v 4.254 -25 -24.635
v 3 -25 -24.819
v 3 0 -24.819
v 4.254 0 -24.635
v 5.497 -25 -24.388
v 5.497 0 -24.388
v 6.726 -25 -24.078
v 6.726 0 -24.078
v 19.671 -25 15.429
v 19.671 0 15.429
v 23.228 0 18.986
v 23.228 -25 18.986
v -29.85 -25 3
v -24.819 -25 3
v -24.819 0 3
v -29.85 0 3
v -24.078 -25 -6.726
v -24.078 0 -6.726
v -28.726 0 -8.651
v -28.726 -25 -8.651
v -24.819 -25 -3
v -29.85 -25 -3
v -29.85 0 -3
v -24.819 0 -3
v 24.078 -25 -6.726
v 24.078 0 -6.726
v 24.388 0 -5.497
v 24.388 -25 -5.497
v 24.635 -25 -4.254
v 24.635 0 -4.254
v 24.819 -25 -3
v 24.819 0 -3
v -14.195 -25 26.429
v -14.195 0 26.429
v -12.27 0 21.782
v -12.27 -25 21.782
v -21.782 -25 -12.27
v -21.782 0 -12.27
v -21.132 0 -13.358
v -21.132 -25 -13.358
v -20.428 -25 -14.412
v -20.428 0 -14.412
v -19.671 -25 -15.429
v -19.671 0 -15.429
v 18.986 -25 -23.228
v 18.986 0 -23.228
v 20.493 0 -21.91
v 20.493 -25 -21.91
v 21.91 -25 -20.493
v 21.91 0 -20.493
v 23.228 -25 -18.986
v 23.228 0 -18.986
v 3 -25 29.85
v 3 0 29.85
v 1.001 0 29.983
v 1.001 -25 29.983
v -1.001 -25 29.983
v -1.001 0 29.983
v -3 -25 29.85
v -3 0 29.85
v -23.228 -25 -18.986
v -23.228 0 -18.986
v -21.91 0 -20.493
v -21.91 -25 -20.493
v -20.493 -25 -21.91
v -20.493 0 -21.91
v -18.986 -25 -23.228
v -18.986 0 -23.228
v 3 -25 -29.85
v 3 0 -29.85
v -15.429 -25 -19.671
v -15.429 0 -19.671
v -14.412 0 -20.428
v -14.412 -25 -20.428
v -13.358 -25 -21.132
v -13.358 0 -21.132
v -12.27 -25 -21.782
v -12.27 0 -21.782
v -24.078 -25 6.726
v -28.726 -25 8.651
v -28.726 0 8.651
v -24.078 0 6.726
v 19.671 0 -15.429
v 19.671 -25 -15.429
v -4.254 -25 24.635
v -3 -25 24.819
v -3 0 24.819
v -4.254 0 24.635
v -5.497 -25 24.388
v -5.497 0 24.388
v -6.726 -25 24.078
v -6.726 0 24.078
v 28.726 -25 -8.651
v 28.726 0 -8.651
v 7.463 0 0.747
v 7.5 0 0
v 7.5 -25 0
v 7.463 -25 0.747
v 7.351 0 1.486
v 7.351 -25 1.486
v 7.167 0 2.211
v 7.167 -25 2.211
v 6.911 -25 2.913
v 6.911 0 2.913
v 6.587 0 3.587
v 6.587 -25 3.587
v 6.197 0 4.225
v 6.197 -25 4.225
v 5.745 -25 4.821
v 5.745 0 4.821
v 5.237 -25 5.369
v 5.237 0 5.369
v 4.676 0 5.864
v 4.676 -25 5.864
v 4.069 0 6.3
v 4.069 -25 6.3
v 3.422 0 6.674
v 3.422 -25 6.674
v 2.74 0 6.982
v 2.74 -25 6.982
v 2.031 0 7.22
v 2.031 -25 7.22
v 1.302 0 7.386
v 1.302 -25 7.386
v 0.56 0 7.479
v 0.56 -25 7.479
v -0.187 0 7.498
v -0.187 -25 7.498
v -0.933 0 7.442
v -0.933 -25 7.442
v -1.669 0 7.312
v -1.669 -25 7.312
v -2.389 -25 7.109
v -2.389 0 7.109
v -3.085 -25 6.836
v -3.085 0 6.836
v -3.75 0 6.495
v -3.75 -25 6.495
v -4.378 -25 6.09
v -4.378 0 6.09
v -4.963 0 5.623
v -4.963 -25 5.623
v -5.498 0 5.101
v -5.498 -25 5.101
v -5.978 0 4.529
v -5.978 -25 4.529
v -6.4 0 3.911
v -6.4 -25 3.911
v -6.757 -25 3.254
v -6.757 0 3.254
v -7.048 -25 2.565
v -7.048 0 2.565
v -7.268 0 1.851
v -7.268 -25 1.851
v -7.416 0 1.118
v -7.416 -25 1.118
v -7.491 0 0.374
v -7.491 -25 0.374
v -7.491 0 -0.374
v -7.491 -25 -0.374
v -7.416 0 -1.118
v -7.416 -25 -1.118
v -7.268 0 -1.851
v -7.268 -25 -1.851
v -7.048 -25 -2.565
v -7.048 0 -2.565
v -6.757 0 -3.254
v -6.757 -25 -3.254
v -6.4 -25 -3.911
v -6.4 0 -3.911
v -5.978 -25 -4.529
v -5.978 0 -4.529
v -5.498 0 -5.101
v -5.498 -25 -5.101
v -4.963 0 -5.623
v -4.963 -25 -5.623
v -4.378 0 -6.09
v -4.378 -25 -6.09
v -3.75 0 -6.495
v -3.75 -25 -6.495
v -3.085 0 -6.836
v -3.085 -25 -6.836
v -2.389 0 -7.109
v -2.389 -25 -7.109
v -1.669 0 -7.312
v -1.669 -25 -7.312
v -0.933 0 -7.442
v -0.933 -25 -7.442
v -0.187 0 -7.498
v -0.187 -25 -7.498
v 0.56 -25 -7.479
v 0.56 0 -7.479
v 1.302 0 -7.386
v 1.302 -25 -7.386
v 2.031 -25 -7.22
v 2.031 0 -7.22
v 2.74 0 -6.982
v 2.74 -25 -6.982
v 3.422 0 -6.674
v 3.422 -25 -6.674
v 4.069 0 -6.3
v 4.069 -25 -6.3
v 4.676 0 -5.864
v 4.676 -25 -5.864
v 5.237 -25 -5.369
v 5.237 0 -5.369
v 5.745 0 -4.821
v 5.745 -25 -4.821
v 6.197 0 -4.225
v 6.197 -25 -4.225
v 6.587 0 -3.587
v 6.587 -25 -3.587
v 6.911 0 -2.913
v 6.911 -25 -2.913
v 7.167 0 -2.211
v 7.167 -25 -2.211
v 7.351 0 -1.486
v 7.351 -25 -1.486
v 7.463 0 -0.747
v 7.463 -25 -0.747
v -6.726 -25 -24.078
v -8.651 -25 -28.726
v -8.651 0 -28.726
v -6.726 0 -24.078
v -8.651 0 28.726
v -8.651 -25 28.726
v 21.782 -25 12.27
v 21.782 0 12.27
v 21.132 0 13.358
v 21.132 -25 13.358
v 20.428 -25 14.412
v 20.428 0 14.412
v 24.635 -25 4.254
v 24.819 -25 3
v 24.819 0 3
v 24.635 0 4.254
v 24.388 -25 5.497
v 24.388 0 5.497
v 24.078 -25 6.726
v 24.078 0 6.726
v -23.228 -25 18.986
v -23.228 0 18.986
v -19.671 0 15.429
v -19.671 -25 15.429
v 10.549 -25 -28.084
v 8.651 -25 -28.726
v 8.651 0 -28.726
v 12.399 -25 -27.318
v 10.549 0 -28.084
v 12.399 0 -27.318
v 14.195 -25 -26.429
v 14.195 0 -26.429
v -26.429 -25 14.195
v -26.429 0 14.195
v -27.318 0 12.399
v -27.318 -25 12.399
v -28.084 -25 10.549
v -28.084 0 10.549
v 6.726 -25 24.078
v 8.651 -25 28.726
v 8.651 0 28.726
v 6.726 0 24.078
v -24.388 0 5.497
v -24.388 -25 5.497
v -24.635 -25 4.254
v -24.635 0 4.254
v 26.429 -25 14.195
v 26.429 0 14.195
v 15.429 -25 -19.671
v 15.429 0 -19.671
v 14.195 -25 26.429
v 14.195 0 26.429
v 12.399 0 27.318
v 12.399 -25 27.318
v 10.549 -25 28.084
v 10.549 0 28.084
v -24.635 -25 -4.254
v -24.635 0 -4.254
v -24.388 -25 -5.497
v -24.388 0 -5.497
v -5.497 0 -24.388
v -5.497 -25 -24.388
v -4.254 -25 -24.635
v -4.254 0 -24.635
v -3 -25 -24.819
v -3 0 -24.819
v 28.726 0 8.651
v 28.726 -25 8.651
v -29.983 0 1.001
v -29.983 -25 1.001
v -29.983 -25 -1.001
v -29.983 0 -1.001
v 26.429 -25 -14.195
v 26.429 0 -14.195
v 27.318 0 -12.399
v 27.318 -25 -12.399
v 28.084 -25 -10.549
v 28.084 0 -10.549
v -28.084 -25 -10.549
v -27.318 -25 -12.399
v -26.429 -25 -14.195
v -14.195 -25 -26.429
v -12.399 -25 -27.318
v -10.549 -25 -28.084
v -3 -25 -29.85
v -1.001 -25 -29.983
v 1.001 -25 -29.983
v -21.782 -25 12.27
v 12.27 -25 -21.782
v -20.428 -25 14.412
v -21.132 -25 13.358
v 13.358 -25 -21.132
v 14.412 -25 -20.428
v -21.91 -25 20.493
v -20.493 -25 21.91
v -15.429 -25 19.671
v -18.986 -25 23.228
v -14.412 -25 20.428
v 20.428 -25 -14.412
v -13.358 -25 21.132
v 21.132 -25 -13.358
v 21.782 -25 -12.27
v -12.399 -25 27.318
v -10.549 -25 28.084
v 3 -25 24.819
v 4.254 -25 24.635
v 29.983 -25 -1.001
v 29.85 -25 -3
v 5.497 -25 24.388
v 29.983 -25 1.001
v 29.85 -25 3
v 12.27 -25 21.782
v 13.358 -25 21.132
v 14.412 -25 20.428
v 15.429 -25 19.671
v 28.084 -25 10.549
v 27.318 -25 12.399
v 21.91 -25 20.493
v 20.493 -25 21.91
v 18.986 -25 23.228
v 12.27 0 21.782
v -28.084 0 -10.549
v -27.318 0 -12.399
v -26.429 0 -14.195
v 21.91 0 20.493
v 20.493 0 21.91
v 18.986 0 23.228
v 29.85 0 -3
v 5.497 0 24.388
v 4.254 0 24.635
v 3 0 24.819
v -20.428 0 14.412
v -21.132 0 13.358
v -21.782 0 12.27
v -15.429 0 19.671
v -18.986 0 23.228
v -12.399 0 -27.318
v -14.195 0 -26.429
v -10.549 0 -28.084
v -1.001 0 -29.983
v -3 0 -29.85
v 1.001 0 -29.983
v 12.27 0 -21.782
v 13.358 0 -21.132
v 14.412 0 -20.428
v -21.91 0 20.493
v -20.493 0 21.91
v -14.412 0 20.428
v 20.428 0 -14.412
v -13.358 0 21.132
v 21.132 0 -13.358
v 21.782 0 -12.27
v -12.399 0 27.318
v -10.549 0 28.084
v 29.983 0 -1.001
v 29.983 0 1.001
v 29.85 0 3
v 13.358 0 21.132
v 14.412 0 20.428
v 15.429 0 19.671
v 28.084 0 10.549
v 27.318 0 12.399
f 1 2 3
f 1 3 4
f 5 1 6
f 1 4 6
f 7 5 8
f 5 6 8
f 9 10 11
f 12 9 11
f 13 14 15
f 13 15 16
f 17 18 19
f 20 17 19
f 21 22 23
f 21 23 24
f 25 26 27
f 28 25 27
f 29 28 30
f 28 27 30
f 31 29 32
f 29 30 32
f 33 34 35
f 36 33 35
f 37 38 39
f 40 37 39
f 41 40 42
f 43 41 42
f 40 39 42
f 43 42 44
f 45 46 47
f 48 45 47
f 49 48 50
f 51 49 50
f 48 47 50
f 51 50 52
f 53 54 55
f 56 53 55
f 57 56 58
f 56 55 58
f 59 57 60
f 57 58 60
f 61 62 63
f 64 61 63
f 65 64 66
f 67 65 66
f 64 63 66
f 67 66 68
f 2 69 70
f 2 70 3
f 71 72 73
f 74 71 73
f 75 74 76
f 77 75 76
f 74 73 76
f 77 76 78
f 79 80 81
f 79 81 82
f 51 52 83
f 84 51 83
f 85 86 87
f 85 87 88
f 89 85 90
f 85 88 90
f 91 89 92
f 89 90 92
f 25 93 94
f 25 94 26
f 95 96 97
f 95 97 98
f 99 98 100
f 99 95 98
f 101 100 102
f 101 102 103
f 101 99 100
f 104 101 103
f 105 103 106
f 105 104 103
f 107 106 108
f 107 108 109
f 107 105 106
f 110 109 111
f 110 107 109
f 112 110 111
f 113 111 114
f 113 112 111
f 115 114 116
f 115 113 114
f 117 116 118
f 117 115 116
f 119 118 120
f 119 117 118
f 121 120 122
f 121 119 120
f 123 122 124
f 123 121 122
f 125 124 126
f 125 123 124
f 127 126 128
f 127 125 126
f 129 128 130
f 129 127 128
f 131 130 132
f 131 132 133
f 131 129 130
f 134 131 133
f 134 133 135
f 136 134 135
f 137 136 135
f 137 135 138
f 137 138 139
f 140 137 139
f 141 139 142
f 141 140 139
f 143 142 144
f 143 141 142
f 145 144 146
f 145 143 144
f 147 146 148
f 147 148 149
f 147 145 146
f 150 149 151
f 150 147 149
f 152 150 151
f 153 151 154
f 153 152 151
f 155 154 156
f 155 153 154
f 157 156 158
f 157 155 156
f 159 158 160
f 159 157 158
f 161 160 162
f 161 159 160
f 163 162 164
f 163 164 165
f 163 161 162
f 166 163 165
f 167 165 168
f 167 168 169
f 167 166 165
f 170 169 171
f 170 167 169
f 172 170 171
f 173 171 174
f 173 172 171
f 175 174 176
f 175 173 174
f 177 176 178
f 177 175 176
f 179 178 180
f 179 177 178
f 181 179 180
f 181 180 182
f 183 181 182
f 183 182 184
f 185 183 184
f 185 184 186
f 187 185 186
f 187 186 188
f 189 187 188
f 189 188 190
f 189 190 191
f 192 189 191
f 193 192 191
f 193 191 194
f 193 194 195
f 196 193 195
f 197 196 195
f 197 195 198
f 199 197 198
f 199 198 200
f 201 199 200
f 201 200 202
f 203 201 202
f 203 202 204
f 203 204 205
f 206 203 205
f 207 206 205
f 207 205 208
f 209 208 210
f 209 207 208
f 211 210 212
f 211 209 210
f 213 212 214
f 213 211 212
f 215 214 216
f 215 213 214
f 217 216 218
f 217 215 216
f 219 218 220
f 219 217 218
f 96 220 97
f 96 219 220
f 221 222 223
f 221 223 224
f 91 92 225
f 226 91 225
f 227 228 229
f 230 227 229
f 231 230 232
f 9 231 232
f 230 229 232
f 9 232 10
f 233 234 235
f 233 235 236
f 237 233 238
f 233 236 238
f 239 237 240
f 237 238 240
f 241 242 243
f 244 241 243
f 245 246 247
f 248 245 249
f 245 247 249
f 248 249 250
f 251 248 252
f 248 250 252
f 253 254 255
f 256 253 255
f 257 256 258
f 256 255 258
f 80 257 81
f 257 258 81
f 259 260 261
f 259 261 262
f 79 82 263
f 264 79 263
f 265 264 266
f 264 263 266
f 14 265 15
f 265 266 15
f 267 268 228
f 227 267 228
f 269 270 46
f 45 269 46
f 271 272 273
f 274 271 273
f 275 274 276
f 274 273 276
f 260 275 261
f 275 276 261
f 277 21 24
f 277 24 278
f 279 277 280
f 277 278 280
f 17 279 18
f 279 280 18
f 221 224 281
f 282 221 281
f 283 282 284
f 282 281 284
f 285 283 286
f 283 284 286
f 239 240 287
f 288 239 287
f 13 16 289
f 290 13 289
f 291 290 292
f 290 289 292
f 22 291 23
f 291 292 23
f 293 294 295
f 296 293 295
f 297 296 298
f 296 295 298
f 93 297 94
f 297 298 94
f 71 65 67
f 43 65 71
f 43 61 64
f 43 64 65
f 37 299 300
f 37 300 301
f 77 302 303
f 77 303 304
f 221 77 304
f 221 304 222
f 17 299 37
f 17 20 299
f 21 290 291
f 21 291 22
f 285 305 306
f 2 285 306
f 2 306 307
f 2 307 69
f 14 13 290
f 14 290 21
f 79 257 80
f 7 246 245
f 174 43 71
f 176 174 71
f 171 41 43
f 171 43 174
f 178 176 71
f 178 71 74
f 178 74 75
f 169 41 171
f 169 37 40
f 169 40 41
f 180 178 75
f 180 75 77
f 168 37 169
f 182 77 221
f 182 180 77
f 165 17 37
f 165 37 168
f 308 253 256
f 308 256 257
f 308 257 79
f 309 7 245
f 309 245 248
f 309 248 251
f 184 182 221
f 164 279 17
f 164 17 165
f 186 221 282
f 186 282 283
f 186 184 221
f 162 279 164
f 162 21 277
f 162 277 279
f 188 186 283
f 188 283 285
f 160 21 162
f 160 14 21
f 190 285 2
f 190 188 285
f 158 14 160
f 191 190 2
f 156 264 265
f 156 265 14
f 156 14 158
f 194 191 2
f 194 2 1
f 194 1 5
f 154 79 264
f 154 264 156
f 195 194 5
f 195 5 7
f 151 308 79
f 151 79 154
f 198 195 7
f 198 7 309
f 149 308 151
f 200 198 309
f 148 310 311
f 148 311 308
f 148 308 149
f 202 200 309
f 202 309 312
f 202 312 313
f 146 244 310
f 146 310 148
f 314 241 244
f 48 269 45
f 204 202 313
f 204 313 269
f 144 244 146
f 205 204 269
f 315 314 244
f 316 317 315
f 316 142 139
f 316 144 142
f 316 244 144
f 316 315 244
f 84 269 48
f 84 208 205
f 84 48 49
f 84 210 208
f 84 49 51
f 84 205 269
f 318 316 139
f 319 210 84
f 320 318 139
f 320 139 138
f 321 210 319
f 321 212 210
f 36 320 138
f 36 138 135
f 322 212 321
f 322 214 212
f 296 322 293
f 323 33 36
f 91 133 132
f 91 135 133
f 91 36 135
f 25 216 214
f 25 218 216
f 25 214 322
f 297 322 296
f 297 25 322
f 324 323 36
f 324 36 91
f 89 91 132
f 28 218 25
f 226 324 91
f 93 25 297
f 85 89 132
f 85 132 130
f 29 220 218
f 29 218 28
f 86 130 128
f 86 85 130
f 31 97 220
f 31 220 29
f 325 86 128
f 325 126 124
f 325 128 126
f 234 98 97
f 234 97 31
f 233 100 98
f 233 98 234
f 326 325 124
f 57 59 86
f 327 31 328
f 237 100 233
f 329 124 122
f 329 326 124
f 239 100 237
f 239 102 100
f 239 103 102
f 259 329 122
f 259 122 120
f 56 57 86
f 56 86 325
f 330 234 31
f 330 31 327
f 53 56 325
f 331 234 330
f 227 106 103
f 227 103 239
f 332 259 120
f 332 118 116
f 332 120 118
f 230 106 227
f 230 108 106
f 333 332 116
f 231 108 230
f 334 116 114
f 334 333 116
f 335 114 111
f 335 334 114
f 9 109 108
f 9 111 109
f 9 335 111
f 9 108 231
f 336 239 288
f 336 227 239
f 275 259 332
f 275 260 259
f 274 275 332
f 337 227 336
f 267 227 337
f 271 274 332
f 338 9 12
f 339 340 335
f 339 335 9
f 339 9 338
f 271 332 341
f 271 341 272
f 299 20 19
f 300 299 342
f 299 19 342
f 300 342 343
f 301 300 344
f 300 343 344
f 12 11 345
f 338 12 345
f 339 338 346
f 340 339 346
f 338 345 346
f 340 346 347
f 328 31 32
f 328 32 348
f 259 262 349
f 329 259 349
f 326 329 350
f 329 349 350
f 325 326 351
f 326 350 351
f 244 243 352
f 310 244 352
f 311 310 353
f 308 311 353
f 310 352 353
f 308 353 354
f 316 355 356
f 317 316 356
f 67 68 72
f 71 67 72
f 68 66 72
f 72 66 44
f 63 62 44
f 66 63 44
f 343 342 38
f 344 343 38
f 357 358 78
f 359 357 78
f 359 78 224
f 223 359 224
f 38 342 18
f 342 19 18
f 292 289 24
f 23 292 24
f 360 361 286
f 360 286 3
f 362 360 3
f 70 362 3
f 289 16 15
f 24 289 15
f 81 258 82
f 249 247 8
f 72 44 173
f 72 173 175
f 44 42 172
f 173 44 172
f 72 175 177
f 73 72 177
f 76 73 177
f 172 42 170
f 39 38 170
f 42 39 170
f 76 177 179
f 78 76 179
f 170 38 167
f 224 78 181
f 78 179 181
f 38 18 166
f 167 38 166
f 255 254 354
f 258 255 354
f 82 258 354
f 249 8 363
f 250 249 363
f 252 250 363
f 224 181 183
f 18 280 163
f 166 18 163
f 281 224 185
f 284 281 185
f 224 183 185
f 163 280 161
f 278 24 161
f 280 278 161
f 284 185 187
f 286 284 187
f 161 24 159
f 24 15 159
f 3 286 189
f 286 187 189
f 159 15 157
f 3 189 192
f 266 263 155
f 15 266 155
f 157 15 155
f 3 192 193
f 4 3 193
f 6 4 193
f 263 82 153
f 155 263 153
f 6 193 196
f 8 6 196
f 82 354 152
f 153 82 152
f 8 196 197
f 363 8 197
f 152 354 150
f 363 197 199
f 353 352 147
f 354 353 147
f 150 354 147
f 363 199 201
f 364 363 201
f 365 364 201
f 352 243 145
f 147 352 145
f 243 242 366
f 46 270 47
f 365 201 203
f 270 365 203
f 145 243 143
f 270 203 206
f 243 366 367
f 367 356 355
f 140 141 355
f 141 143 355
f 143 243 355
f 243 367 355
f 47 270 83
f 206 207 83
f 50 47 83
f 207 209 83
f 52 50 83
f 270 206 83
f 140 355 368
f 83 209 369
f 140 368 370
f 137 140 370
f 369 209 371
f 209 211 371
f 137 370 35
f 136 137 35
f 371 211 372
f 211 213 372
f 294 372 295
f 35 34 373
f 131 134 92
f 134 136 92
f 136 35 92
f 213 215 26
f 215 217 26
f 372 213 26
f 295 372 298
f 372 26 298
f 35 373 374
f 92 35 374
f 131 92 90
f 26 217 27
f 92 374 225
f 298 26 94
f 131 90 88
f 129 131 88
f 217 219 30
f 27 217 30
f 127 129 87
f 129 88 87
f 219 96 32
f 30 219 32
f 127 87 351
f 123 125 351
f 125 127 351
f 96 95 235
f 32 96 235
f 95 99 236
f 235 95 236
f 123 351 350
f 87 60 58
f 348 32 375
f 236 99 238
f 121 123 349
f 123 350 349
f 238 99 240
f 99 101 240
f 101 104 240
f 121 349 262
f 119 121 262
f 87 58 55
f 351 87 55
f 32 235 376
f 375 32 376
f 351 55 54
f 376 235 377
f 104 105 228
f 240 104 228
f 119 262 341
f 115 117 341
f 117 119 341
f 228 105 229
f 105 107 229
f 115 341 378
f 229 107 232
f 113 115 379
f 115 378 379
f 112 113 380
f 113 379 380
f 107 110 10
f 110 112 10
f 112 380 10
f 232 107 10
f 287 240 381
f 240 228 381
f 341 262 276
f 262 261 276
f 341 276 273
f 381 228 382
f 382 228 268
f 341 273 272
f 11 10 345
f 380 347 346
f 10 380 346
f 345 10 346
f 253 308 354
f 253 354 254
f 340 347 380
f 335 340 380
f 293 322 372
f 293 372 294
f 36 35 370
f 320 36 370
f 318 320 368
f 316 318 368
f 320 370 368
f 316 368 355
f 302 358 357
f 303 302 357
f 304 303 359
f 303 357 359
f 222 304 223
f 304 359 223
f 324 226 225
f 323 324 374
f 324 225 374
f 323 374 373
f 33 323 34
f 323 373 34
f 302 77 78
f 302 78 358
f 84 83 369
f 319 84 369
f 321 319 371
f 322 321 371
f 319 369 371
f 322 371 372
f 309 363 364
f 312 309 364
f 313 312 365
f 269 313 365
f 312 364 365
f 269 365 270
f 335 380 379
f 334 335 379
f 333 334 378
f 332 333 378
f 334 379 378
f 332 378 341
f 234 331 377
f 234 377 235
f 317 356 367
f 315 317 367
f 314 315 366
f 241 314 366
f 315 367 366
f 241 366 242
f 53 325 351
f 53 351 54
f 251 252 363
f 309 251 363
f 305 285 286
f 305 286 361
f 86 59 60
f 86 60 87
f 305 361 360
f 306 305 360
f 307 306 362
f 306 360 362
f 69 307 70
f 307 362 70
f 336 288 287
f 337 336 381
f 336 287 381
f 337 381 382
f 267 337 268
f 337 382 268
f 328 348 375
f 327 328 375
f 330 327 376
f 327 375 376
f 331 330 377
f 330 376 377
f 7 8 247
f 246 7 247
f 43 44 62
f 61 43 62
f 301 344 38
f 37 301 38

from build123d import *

# Parameters (mm, degrees)
F0_R     = 7.5
F1_DEPTH = 25


with BuildPart() as f1:
    # F0 (on Front) → F1 (new body)
    with BuildSketch(Plane.XZ):
        with BuildLine():
            Line((3, 24.819347), (3, 29.849623))
            ThreePointArc((3, 29.849623), (0, 30), (-3, 29.849623))
            Line((-3, 29.849623), (-3, 24.819347))
            ThreePointArc((-3, 24.819347), (-4.877258, 24.519632), (-6.726314, 24.078137))
            ThreePointArc((-6.726314, 24.078137), (-9.567086, 23.096988), (-12.269592, 21.782037))
            ThreePointArc((-12.269592, 21.782037), (-13.889256, 20.78674), (-15.428608, 19.671249))
            ThreePointArc((-15.428608, 19.671249), (-17.67767, 17.67767), (-19.671249, 15.428608))
            ThreePointArc((-19.671249, 15.428608), (-20.78674, 13.889256), (-21.782037, 12.269592))
            ThreePointArc((-21.782037, 12.269592), (-23.096988, 9.567086), (-24.078137, 6.726314))
            ThreePointArc((-24.078137, 6.726314), (-24.519632, 4.877258), (-24.819347, 3))
            ThreePointArc((-24.819347, 3), (-25, 0), (-24.819347, -3))
            ThreePointArc((-24.819347, -3), (-24.519632, -4.877258), (-24.078137, -6.726314))
            ThreePointArc((-24.078137, -6.726314), (-23.096988, -9.567086), (-21.782037, -12.269592))
            ThreePointArc((-21.782037, -12.269592), (-20.78674, -13.889256), (-19.671249, -15.428608))
            ThreePointArc((-19.671249, -15.428608), (-17.67767, -17.67767), (-15.428608, -19.671249))
            ThreePointArc((-15.428608, -19.671249), (-13.889256, -20.78674), (-12.269592, -21.782037))
            ThreePointArc((-12.269592, -21.782037), (-9.567086, -23.096988), (-6.726314, -24.078137))
            ThreePointArc((-6.726314, -24.078137), (-4.877258, -24.519632), (-3, -24.819347))
            ThreePointArc((-3, -24.819347), (0, -25), (3, -24.819347))
            ThreePointArc((3, -24.819347), (4.877258, -24.519632), (6.726314, -24.078137))
            ThreePointArc((6.726314, -24.078137), (9.567086, -23.096988), (12.269592, -21.782037))
            ThreePointArc((12.269592, -21.782037), (13.889256, -20.78674), (15.428608, -19.671249))
            ThreePointArc((15.428608, -19.671249), (17.67767, -17.67767), (19.671249, -15.428608))
            ThreePointArc((19.671249, -15.428608), (20.78674, -13.889256), (21.782037, -12.269592))
            ThreePointArc((21.782037, -12.269592), (23.096988, -9.567086), (24.078137, -6.726314))
            ThreePointArc((24.078137, -6.726314), (24.519632, -4.877258), (24.819347, -3))
            ThreePointArc((24.819347, -3), (25, 0), (24.819347, 3))
            ThreePointArc((24.819347, 3), (24.519632, 4.877258), (24.078137, 6.726314))
            ThreePointArc((24.078137, 6.726314), (23.096988, 9.567086), (21.782037, 12.269592))
            ThreePointArc((21.782037, 12.269592), (20.78674, 13.889256), (19.671249, 15.428608))
            ThreePointArc((19.671249, 15.428608), (17.67767, 17.67767), (15.428608, 19.671249))
            ThreePointArc((15.428608, 19.671249), (13.889256, 20.78674), (12.269592, 21.782037))
            ThreePointArc((12.269592, 21.782037), (9.567086, 23.096988), (6.726314, 24.078137))
            ThreePointArc((6.726314, 24.078137), (4.877258, 24.519632), (3, 24.819347))
        make_face()
        Circle(F0_R, mode=Mode.SUBTRACT)
        with BuildLine():
            Line((8.651318, 28.725506), (6.726314, 24.078137))
            ThreePointArc((6.726314, 24.078137), (9.567086, 23.096988), (12.269592, 21.782037))
            Line((12.269592, 21.782037), (14.194595, 26.429406))
            ThreePointArc((14.194595, 26.429406), (11.480503, 27.716386), (8.651318, 28.725506))
        make_face()
        with BuildLine():
            ThreePointArc((-12.269592, 21.782037), (-9.567086, 23.096988), (-6.726314, 24.078137))
            Line((-6.726314, 24.078137), (-8.651318, 28.725506))
            ThreePointArc((-8.651318, 28.725506), (-11.480503, 27.716386), (-14.194595, 26.429406))
            Line((-14.194595, 26.429406), (-12.269592, 21.782037))
        make_face()
        with BuildLine():
            Line((18.985551, 23.228191), (15.428608, 19.671249))
            ThreePointArc((15.428608, 19.671249), (17.67767, 17.67767), (19.671249, 15.428608))
            Line((19.671249, 15.428608), (23.228191, 18.985551))
            ThreePointArc((23.228191, 18.985551), (21.213203, 21.213203), (18.985551, 23.228191))
        make_face()
        with BuildLine():
            ThreePointArc((-19.671249, 15.428608), (-17.67767, 17.67767), (-15.428608, 19.671249))
            Line((-15.428608, 19.671249), (-18.985551, 23.228191))
            ThreePointArc((-18.985551, 23.228191), (-21.213203, 21.213203), (-23.228191, 18.985551))
            Line((-23.228191, 18.985551), (-19.671249, 15.428608))
        make_face()
        with BuildLine():
            Line((26.429406, 14.194595), (21.782037, 12.269592))
            ThreePointArc((21.782037, 12.269592), (23.096988, 9.567086), (24.078137, 6.726314))
            Line((24.078137, 6.726314), (28.725506, 8.651318))
            ThreePointArc((28.725506, 8.651318), (27.716386, 11.480503), (26.429406, 14.194595))
        make_face()
        with BuildLine():
            ThreePointArc((-24.078137, 6.726314), (-23.096988, 9.567086), (-21.782037, 12.269592))
            Line((-21.782037, 12.269592), (-26.429406, 14.194595))
            ThreePointArc((-26.429406, 14.194595), (-27.716386, 11.480503), (-28.725506, 8.651318))
            Line((-28.725506, 8.651318), (-24.078137, 6.726314))
        make_face()
        with BuildLine():
            Line((29.849623, 3), (24.819347, 3))
            ThreePointArc((24.819347, 3), (25, 0), (24.819347, -3))
            Line((24.819347, -3), (29.849623, -3))
            ThreePointArc((29.849623, -3), (30, 0), (29.849623, 3))
        make_face()
        with BuildLine():
            ThreePointArc((-24.819347, -3), (-25, 0), (-24.819347, 3))
            Line((-24.819347, 3), (-29.849623, 3))
            ThreePointArc((-29.849623, 3), (-30, 0), (-29.849623, -3))
            Line((-29.849623, -3), (-24.819347, -3))
        make_face()
        with BuildLine():
            Line((28.725506, -8.651318), (24.078137, -6.726314))
            ThreePointArc((24.078137, -6.726314), (23.096988, -9.567086), (21.782037, -12.269592))
            Line((21.782037, -12.269592), (26.429406, -14.194595))
            ThreePointArc((26.429406, -14.194595), (27.716386, -11.480503), (28.725506, -8.651318))
        make_face()
        with BuildLine():
            ThreePointArc((-21.782037, -12.269592), (-23.096988, -9.567086), (-24.078137, -6.726314))
            Line((-24.078137, -6.726314), (-28.725506, -8.651318))
            ThreePointArc((-28.725506, -8.651318), (-27.716386, -11.480503), (-26.429406, -14.194595))
            Line((-26.429406, -14.194595), (-21.782037, -12.269592))
        make_face()
        with BuildLine():
            Line((23.228191, -18.985551), (19.671249, -15.428608))
            ThreePointArc((19.671249, -15.428608), (17.67767, -17.67767), (15.428608, -19.671249))
            Line((15.428608, -19.671249), (18.985551, -23.228191))
            ThreePointArc((18.985551, -23.228191), (21.213203, -21.213203), (23.228191, -18.985551))
        make_face()
        with BuildLine():
            ThreePointArc((-15.428608, -19.671249), (-17.67767, -17.67767), (-19.671249, -15.428608))
            Line((-19.671249, -15.428608), (-23.228191, -18.985551))
            ThreePointArc((-23.228191, -18.985551), (-21.213203, -21.213203), (-18.985551, -23.228191))
            Line((-18.985551, -23.228191), (-15.428608, -19.671249))
        make_face()
        with BuildLine():
            Line((14.194595, -26.429406), (12.269592, -21.782037))
            ThreePointArc((12.269592, -21.782037), (9.567086, -23.096988), (6.726314, -24.078137))
            Line((6.726314, -24.078137), (8.651318, -28.725506))
            ThreePointArc((8.651318, -28.725506), (11.480503, -27.716386), (14.194595, -26.429406))
        make_face()
        with BuildLine():
            ThreePointArc((-6.726314, -24.078137), (-9.567086, -23.096988), (-12.269592, -21.782037))
            Line((-12.269592, -21.782037), (-14.194595, -26.429406))
            ThreePointArc((-14.194595, -26.429406), (-11.480503, -27.716386), (-8.651318, -28.725506))
            Line((-8.651318, -28.725506), (-6.726314, -24.078137))
        make_face()
        with BuildLine():
            Line((3, -29.849623), (3, -24.819347))
            ThreePointArc((3, -24.819347), (0, -25), (-3, -24.819347))
            Line((-3, -24.819347), (-3, -29.849623))
            ThreePointArc((-3, -29.849623), (0, -30), (3, -29.849623))
        make_face()
    extrude(amount=F1_DEPTH)


solid = f1.part
